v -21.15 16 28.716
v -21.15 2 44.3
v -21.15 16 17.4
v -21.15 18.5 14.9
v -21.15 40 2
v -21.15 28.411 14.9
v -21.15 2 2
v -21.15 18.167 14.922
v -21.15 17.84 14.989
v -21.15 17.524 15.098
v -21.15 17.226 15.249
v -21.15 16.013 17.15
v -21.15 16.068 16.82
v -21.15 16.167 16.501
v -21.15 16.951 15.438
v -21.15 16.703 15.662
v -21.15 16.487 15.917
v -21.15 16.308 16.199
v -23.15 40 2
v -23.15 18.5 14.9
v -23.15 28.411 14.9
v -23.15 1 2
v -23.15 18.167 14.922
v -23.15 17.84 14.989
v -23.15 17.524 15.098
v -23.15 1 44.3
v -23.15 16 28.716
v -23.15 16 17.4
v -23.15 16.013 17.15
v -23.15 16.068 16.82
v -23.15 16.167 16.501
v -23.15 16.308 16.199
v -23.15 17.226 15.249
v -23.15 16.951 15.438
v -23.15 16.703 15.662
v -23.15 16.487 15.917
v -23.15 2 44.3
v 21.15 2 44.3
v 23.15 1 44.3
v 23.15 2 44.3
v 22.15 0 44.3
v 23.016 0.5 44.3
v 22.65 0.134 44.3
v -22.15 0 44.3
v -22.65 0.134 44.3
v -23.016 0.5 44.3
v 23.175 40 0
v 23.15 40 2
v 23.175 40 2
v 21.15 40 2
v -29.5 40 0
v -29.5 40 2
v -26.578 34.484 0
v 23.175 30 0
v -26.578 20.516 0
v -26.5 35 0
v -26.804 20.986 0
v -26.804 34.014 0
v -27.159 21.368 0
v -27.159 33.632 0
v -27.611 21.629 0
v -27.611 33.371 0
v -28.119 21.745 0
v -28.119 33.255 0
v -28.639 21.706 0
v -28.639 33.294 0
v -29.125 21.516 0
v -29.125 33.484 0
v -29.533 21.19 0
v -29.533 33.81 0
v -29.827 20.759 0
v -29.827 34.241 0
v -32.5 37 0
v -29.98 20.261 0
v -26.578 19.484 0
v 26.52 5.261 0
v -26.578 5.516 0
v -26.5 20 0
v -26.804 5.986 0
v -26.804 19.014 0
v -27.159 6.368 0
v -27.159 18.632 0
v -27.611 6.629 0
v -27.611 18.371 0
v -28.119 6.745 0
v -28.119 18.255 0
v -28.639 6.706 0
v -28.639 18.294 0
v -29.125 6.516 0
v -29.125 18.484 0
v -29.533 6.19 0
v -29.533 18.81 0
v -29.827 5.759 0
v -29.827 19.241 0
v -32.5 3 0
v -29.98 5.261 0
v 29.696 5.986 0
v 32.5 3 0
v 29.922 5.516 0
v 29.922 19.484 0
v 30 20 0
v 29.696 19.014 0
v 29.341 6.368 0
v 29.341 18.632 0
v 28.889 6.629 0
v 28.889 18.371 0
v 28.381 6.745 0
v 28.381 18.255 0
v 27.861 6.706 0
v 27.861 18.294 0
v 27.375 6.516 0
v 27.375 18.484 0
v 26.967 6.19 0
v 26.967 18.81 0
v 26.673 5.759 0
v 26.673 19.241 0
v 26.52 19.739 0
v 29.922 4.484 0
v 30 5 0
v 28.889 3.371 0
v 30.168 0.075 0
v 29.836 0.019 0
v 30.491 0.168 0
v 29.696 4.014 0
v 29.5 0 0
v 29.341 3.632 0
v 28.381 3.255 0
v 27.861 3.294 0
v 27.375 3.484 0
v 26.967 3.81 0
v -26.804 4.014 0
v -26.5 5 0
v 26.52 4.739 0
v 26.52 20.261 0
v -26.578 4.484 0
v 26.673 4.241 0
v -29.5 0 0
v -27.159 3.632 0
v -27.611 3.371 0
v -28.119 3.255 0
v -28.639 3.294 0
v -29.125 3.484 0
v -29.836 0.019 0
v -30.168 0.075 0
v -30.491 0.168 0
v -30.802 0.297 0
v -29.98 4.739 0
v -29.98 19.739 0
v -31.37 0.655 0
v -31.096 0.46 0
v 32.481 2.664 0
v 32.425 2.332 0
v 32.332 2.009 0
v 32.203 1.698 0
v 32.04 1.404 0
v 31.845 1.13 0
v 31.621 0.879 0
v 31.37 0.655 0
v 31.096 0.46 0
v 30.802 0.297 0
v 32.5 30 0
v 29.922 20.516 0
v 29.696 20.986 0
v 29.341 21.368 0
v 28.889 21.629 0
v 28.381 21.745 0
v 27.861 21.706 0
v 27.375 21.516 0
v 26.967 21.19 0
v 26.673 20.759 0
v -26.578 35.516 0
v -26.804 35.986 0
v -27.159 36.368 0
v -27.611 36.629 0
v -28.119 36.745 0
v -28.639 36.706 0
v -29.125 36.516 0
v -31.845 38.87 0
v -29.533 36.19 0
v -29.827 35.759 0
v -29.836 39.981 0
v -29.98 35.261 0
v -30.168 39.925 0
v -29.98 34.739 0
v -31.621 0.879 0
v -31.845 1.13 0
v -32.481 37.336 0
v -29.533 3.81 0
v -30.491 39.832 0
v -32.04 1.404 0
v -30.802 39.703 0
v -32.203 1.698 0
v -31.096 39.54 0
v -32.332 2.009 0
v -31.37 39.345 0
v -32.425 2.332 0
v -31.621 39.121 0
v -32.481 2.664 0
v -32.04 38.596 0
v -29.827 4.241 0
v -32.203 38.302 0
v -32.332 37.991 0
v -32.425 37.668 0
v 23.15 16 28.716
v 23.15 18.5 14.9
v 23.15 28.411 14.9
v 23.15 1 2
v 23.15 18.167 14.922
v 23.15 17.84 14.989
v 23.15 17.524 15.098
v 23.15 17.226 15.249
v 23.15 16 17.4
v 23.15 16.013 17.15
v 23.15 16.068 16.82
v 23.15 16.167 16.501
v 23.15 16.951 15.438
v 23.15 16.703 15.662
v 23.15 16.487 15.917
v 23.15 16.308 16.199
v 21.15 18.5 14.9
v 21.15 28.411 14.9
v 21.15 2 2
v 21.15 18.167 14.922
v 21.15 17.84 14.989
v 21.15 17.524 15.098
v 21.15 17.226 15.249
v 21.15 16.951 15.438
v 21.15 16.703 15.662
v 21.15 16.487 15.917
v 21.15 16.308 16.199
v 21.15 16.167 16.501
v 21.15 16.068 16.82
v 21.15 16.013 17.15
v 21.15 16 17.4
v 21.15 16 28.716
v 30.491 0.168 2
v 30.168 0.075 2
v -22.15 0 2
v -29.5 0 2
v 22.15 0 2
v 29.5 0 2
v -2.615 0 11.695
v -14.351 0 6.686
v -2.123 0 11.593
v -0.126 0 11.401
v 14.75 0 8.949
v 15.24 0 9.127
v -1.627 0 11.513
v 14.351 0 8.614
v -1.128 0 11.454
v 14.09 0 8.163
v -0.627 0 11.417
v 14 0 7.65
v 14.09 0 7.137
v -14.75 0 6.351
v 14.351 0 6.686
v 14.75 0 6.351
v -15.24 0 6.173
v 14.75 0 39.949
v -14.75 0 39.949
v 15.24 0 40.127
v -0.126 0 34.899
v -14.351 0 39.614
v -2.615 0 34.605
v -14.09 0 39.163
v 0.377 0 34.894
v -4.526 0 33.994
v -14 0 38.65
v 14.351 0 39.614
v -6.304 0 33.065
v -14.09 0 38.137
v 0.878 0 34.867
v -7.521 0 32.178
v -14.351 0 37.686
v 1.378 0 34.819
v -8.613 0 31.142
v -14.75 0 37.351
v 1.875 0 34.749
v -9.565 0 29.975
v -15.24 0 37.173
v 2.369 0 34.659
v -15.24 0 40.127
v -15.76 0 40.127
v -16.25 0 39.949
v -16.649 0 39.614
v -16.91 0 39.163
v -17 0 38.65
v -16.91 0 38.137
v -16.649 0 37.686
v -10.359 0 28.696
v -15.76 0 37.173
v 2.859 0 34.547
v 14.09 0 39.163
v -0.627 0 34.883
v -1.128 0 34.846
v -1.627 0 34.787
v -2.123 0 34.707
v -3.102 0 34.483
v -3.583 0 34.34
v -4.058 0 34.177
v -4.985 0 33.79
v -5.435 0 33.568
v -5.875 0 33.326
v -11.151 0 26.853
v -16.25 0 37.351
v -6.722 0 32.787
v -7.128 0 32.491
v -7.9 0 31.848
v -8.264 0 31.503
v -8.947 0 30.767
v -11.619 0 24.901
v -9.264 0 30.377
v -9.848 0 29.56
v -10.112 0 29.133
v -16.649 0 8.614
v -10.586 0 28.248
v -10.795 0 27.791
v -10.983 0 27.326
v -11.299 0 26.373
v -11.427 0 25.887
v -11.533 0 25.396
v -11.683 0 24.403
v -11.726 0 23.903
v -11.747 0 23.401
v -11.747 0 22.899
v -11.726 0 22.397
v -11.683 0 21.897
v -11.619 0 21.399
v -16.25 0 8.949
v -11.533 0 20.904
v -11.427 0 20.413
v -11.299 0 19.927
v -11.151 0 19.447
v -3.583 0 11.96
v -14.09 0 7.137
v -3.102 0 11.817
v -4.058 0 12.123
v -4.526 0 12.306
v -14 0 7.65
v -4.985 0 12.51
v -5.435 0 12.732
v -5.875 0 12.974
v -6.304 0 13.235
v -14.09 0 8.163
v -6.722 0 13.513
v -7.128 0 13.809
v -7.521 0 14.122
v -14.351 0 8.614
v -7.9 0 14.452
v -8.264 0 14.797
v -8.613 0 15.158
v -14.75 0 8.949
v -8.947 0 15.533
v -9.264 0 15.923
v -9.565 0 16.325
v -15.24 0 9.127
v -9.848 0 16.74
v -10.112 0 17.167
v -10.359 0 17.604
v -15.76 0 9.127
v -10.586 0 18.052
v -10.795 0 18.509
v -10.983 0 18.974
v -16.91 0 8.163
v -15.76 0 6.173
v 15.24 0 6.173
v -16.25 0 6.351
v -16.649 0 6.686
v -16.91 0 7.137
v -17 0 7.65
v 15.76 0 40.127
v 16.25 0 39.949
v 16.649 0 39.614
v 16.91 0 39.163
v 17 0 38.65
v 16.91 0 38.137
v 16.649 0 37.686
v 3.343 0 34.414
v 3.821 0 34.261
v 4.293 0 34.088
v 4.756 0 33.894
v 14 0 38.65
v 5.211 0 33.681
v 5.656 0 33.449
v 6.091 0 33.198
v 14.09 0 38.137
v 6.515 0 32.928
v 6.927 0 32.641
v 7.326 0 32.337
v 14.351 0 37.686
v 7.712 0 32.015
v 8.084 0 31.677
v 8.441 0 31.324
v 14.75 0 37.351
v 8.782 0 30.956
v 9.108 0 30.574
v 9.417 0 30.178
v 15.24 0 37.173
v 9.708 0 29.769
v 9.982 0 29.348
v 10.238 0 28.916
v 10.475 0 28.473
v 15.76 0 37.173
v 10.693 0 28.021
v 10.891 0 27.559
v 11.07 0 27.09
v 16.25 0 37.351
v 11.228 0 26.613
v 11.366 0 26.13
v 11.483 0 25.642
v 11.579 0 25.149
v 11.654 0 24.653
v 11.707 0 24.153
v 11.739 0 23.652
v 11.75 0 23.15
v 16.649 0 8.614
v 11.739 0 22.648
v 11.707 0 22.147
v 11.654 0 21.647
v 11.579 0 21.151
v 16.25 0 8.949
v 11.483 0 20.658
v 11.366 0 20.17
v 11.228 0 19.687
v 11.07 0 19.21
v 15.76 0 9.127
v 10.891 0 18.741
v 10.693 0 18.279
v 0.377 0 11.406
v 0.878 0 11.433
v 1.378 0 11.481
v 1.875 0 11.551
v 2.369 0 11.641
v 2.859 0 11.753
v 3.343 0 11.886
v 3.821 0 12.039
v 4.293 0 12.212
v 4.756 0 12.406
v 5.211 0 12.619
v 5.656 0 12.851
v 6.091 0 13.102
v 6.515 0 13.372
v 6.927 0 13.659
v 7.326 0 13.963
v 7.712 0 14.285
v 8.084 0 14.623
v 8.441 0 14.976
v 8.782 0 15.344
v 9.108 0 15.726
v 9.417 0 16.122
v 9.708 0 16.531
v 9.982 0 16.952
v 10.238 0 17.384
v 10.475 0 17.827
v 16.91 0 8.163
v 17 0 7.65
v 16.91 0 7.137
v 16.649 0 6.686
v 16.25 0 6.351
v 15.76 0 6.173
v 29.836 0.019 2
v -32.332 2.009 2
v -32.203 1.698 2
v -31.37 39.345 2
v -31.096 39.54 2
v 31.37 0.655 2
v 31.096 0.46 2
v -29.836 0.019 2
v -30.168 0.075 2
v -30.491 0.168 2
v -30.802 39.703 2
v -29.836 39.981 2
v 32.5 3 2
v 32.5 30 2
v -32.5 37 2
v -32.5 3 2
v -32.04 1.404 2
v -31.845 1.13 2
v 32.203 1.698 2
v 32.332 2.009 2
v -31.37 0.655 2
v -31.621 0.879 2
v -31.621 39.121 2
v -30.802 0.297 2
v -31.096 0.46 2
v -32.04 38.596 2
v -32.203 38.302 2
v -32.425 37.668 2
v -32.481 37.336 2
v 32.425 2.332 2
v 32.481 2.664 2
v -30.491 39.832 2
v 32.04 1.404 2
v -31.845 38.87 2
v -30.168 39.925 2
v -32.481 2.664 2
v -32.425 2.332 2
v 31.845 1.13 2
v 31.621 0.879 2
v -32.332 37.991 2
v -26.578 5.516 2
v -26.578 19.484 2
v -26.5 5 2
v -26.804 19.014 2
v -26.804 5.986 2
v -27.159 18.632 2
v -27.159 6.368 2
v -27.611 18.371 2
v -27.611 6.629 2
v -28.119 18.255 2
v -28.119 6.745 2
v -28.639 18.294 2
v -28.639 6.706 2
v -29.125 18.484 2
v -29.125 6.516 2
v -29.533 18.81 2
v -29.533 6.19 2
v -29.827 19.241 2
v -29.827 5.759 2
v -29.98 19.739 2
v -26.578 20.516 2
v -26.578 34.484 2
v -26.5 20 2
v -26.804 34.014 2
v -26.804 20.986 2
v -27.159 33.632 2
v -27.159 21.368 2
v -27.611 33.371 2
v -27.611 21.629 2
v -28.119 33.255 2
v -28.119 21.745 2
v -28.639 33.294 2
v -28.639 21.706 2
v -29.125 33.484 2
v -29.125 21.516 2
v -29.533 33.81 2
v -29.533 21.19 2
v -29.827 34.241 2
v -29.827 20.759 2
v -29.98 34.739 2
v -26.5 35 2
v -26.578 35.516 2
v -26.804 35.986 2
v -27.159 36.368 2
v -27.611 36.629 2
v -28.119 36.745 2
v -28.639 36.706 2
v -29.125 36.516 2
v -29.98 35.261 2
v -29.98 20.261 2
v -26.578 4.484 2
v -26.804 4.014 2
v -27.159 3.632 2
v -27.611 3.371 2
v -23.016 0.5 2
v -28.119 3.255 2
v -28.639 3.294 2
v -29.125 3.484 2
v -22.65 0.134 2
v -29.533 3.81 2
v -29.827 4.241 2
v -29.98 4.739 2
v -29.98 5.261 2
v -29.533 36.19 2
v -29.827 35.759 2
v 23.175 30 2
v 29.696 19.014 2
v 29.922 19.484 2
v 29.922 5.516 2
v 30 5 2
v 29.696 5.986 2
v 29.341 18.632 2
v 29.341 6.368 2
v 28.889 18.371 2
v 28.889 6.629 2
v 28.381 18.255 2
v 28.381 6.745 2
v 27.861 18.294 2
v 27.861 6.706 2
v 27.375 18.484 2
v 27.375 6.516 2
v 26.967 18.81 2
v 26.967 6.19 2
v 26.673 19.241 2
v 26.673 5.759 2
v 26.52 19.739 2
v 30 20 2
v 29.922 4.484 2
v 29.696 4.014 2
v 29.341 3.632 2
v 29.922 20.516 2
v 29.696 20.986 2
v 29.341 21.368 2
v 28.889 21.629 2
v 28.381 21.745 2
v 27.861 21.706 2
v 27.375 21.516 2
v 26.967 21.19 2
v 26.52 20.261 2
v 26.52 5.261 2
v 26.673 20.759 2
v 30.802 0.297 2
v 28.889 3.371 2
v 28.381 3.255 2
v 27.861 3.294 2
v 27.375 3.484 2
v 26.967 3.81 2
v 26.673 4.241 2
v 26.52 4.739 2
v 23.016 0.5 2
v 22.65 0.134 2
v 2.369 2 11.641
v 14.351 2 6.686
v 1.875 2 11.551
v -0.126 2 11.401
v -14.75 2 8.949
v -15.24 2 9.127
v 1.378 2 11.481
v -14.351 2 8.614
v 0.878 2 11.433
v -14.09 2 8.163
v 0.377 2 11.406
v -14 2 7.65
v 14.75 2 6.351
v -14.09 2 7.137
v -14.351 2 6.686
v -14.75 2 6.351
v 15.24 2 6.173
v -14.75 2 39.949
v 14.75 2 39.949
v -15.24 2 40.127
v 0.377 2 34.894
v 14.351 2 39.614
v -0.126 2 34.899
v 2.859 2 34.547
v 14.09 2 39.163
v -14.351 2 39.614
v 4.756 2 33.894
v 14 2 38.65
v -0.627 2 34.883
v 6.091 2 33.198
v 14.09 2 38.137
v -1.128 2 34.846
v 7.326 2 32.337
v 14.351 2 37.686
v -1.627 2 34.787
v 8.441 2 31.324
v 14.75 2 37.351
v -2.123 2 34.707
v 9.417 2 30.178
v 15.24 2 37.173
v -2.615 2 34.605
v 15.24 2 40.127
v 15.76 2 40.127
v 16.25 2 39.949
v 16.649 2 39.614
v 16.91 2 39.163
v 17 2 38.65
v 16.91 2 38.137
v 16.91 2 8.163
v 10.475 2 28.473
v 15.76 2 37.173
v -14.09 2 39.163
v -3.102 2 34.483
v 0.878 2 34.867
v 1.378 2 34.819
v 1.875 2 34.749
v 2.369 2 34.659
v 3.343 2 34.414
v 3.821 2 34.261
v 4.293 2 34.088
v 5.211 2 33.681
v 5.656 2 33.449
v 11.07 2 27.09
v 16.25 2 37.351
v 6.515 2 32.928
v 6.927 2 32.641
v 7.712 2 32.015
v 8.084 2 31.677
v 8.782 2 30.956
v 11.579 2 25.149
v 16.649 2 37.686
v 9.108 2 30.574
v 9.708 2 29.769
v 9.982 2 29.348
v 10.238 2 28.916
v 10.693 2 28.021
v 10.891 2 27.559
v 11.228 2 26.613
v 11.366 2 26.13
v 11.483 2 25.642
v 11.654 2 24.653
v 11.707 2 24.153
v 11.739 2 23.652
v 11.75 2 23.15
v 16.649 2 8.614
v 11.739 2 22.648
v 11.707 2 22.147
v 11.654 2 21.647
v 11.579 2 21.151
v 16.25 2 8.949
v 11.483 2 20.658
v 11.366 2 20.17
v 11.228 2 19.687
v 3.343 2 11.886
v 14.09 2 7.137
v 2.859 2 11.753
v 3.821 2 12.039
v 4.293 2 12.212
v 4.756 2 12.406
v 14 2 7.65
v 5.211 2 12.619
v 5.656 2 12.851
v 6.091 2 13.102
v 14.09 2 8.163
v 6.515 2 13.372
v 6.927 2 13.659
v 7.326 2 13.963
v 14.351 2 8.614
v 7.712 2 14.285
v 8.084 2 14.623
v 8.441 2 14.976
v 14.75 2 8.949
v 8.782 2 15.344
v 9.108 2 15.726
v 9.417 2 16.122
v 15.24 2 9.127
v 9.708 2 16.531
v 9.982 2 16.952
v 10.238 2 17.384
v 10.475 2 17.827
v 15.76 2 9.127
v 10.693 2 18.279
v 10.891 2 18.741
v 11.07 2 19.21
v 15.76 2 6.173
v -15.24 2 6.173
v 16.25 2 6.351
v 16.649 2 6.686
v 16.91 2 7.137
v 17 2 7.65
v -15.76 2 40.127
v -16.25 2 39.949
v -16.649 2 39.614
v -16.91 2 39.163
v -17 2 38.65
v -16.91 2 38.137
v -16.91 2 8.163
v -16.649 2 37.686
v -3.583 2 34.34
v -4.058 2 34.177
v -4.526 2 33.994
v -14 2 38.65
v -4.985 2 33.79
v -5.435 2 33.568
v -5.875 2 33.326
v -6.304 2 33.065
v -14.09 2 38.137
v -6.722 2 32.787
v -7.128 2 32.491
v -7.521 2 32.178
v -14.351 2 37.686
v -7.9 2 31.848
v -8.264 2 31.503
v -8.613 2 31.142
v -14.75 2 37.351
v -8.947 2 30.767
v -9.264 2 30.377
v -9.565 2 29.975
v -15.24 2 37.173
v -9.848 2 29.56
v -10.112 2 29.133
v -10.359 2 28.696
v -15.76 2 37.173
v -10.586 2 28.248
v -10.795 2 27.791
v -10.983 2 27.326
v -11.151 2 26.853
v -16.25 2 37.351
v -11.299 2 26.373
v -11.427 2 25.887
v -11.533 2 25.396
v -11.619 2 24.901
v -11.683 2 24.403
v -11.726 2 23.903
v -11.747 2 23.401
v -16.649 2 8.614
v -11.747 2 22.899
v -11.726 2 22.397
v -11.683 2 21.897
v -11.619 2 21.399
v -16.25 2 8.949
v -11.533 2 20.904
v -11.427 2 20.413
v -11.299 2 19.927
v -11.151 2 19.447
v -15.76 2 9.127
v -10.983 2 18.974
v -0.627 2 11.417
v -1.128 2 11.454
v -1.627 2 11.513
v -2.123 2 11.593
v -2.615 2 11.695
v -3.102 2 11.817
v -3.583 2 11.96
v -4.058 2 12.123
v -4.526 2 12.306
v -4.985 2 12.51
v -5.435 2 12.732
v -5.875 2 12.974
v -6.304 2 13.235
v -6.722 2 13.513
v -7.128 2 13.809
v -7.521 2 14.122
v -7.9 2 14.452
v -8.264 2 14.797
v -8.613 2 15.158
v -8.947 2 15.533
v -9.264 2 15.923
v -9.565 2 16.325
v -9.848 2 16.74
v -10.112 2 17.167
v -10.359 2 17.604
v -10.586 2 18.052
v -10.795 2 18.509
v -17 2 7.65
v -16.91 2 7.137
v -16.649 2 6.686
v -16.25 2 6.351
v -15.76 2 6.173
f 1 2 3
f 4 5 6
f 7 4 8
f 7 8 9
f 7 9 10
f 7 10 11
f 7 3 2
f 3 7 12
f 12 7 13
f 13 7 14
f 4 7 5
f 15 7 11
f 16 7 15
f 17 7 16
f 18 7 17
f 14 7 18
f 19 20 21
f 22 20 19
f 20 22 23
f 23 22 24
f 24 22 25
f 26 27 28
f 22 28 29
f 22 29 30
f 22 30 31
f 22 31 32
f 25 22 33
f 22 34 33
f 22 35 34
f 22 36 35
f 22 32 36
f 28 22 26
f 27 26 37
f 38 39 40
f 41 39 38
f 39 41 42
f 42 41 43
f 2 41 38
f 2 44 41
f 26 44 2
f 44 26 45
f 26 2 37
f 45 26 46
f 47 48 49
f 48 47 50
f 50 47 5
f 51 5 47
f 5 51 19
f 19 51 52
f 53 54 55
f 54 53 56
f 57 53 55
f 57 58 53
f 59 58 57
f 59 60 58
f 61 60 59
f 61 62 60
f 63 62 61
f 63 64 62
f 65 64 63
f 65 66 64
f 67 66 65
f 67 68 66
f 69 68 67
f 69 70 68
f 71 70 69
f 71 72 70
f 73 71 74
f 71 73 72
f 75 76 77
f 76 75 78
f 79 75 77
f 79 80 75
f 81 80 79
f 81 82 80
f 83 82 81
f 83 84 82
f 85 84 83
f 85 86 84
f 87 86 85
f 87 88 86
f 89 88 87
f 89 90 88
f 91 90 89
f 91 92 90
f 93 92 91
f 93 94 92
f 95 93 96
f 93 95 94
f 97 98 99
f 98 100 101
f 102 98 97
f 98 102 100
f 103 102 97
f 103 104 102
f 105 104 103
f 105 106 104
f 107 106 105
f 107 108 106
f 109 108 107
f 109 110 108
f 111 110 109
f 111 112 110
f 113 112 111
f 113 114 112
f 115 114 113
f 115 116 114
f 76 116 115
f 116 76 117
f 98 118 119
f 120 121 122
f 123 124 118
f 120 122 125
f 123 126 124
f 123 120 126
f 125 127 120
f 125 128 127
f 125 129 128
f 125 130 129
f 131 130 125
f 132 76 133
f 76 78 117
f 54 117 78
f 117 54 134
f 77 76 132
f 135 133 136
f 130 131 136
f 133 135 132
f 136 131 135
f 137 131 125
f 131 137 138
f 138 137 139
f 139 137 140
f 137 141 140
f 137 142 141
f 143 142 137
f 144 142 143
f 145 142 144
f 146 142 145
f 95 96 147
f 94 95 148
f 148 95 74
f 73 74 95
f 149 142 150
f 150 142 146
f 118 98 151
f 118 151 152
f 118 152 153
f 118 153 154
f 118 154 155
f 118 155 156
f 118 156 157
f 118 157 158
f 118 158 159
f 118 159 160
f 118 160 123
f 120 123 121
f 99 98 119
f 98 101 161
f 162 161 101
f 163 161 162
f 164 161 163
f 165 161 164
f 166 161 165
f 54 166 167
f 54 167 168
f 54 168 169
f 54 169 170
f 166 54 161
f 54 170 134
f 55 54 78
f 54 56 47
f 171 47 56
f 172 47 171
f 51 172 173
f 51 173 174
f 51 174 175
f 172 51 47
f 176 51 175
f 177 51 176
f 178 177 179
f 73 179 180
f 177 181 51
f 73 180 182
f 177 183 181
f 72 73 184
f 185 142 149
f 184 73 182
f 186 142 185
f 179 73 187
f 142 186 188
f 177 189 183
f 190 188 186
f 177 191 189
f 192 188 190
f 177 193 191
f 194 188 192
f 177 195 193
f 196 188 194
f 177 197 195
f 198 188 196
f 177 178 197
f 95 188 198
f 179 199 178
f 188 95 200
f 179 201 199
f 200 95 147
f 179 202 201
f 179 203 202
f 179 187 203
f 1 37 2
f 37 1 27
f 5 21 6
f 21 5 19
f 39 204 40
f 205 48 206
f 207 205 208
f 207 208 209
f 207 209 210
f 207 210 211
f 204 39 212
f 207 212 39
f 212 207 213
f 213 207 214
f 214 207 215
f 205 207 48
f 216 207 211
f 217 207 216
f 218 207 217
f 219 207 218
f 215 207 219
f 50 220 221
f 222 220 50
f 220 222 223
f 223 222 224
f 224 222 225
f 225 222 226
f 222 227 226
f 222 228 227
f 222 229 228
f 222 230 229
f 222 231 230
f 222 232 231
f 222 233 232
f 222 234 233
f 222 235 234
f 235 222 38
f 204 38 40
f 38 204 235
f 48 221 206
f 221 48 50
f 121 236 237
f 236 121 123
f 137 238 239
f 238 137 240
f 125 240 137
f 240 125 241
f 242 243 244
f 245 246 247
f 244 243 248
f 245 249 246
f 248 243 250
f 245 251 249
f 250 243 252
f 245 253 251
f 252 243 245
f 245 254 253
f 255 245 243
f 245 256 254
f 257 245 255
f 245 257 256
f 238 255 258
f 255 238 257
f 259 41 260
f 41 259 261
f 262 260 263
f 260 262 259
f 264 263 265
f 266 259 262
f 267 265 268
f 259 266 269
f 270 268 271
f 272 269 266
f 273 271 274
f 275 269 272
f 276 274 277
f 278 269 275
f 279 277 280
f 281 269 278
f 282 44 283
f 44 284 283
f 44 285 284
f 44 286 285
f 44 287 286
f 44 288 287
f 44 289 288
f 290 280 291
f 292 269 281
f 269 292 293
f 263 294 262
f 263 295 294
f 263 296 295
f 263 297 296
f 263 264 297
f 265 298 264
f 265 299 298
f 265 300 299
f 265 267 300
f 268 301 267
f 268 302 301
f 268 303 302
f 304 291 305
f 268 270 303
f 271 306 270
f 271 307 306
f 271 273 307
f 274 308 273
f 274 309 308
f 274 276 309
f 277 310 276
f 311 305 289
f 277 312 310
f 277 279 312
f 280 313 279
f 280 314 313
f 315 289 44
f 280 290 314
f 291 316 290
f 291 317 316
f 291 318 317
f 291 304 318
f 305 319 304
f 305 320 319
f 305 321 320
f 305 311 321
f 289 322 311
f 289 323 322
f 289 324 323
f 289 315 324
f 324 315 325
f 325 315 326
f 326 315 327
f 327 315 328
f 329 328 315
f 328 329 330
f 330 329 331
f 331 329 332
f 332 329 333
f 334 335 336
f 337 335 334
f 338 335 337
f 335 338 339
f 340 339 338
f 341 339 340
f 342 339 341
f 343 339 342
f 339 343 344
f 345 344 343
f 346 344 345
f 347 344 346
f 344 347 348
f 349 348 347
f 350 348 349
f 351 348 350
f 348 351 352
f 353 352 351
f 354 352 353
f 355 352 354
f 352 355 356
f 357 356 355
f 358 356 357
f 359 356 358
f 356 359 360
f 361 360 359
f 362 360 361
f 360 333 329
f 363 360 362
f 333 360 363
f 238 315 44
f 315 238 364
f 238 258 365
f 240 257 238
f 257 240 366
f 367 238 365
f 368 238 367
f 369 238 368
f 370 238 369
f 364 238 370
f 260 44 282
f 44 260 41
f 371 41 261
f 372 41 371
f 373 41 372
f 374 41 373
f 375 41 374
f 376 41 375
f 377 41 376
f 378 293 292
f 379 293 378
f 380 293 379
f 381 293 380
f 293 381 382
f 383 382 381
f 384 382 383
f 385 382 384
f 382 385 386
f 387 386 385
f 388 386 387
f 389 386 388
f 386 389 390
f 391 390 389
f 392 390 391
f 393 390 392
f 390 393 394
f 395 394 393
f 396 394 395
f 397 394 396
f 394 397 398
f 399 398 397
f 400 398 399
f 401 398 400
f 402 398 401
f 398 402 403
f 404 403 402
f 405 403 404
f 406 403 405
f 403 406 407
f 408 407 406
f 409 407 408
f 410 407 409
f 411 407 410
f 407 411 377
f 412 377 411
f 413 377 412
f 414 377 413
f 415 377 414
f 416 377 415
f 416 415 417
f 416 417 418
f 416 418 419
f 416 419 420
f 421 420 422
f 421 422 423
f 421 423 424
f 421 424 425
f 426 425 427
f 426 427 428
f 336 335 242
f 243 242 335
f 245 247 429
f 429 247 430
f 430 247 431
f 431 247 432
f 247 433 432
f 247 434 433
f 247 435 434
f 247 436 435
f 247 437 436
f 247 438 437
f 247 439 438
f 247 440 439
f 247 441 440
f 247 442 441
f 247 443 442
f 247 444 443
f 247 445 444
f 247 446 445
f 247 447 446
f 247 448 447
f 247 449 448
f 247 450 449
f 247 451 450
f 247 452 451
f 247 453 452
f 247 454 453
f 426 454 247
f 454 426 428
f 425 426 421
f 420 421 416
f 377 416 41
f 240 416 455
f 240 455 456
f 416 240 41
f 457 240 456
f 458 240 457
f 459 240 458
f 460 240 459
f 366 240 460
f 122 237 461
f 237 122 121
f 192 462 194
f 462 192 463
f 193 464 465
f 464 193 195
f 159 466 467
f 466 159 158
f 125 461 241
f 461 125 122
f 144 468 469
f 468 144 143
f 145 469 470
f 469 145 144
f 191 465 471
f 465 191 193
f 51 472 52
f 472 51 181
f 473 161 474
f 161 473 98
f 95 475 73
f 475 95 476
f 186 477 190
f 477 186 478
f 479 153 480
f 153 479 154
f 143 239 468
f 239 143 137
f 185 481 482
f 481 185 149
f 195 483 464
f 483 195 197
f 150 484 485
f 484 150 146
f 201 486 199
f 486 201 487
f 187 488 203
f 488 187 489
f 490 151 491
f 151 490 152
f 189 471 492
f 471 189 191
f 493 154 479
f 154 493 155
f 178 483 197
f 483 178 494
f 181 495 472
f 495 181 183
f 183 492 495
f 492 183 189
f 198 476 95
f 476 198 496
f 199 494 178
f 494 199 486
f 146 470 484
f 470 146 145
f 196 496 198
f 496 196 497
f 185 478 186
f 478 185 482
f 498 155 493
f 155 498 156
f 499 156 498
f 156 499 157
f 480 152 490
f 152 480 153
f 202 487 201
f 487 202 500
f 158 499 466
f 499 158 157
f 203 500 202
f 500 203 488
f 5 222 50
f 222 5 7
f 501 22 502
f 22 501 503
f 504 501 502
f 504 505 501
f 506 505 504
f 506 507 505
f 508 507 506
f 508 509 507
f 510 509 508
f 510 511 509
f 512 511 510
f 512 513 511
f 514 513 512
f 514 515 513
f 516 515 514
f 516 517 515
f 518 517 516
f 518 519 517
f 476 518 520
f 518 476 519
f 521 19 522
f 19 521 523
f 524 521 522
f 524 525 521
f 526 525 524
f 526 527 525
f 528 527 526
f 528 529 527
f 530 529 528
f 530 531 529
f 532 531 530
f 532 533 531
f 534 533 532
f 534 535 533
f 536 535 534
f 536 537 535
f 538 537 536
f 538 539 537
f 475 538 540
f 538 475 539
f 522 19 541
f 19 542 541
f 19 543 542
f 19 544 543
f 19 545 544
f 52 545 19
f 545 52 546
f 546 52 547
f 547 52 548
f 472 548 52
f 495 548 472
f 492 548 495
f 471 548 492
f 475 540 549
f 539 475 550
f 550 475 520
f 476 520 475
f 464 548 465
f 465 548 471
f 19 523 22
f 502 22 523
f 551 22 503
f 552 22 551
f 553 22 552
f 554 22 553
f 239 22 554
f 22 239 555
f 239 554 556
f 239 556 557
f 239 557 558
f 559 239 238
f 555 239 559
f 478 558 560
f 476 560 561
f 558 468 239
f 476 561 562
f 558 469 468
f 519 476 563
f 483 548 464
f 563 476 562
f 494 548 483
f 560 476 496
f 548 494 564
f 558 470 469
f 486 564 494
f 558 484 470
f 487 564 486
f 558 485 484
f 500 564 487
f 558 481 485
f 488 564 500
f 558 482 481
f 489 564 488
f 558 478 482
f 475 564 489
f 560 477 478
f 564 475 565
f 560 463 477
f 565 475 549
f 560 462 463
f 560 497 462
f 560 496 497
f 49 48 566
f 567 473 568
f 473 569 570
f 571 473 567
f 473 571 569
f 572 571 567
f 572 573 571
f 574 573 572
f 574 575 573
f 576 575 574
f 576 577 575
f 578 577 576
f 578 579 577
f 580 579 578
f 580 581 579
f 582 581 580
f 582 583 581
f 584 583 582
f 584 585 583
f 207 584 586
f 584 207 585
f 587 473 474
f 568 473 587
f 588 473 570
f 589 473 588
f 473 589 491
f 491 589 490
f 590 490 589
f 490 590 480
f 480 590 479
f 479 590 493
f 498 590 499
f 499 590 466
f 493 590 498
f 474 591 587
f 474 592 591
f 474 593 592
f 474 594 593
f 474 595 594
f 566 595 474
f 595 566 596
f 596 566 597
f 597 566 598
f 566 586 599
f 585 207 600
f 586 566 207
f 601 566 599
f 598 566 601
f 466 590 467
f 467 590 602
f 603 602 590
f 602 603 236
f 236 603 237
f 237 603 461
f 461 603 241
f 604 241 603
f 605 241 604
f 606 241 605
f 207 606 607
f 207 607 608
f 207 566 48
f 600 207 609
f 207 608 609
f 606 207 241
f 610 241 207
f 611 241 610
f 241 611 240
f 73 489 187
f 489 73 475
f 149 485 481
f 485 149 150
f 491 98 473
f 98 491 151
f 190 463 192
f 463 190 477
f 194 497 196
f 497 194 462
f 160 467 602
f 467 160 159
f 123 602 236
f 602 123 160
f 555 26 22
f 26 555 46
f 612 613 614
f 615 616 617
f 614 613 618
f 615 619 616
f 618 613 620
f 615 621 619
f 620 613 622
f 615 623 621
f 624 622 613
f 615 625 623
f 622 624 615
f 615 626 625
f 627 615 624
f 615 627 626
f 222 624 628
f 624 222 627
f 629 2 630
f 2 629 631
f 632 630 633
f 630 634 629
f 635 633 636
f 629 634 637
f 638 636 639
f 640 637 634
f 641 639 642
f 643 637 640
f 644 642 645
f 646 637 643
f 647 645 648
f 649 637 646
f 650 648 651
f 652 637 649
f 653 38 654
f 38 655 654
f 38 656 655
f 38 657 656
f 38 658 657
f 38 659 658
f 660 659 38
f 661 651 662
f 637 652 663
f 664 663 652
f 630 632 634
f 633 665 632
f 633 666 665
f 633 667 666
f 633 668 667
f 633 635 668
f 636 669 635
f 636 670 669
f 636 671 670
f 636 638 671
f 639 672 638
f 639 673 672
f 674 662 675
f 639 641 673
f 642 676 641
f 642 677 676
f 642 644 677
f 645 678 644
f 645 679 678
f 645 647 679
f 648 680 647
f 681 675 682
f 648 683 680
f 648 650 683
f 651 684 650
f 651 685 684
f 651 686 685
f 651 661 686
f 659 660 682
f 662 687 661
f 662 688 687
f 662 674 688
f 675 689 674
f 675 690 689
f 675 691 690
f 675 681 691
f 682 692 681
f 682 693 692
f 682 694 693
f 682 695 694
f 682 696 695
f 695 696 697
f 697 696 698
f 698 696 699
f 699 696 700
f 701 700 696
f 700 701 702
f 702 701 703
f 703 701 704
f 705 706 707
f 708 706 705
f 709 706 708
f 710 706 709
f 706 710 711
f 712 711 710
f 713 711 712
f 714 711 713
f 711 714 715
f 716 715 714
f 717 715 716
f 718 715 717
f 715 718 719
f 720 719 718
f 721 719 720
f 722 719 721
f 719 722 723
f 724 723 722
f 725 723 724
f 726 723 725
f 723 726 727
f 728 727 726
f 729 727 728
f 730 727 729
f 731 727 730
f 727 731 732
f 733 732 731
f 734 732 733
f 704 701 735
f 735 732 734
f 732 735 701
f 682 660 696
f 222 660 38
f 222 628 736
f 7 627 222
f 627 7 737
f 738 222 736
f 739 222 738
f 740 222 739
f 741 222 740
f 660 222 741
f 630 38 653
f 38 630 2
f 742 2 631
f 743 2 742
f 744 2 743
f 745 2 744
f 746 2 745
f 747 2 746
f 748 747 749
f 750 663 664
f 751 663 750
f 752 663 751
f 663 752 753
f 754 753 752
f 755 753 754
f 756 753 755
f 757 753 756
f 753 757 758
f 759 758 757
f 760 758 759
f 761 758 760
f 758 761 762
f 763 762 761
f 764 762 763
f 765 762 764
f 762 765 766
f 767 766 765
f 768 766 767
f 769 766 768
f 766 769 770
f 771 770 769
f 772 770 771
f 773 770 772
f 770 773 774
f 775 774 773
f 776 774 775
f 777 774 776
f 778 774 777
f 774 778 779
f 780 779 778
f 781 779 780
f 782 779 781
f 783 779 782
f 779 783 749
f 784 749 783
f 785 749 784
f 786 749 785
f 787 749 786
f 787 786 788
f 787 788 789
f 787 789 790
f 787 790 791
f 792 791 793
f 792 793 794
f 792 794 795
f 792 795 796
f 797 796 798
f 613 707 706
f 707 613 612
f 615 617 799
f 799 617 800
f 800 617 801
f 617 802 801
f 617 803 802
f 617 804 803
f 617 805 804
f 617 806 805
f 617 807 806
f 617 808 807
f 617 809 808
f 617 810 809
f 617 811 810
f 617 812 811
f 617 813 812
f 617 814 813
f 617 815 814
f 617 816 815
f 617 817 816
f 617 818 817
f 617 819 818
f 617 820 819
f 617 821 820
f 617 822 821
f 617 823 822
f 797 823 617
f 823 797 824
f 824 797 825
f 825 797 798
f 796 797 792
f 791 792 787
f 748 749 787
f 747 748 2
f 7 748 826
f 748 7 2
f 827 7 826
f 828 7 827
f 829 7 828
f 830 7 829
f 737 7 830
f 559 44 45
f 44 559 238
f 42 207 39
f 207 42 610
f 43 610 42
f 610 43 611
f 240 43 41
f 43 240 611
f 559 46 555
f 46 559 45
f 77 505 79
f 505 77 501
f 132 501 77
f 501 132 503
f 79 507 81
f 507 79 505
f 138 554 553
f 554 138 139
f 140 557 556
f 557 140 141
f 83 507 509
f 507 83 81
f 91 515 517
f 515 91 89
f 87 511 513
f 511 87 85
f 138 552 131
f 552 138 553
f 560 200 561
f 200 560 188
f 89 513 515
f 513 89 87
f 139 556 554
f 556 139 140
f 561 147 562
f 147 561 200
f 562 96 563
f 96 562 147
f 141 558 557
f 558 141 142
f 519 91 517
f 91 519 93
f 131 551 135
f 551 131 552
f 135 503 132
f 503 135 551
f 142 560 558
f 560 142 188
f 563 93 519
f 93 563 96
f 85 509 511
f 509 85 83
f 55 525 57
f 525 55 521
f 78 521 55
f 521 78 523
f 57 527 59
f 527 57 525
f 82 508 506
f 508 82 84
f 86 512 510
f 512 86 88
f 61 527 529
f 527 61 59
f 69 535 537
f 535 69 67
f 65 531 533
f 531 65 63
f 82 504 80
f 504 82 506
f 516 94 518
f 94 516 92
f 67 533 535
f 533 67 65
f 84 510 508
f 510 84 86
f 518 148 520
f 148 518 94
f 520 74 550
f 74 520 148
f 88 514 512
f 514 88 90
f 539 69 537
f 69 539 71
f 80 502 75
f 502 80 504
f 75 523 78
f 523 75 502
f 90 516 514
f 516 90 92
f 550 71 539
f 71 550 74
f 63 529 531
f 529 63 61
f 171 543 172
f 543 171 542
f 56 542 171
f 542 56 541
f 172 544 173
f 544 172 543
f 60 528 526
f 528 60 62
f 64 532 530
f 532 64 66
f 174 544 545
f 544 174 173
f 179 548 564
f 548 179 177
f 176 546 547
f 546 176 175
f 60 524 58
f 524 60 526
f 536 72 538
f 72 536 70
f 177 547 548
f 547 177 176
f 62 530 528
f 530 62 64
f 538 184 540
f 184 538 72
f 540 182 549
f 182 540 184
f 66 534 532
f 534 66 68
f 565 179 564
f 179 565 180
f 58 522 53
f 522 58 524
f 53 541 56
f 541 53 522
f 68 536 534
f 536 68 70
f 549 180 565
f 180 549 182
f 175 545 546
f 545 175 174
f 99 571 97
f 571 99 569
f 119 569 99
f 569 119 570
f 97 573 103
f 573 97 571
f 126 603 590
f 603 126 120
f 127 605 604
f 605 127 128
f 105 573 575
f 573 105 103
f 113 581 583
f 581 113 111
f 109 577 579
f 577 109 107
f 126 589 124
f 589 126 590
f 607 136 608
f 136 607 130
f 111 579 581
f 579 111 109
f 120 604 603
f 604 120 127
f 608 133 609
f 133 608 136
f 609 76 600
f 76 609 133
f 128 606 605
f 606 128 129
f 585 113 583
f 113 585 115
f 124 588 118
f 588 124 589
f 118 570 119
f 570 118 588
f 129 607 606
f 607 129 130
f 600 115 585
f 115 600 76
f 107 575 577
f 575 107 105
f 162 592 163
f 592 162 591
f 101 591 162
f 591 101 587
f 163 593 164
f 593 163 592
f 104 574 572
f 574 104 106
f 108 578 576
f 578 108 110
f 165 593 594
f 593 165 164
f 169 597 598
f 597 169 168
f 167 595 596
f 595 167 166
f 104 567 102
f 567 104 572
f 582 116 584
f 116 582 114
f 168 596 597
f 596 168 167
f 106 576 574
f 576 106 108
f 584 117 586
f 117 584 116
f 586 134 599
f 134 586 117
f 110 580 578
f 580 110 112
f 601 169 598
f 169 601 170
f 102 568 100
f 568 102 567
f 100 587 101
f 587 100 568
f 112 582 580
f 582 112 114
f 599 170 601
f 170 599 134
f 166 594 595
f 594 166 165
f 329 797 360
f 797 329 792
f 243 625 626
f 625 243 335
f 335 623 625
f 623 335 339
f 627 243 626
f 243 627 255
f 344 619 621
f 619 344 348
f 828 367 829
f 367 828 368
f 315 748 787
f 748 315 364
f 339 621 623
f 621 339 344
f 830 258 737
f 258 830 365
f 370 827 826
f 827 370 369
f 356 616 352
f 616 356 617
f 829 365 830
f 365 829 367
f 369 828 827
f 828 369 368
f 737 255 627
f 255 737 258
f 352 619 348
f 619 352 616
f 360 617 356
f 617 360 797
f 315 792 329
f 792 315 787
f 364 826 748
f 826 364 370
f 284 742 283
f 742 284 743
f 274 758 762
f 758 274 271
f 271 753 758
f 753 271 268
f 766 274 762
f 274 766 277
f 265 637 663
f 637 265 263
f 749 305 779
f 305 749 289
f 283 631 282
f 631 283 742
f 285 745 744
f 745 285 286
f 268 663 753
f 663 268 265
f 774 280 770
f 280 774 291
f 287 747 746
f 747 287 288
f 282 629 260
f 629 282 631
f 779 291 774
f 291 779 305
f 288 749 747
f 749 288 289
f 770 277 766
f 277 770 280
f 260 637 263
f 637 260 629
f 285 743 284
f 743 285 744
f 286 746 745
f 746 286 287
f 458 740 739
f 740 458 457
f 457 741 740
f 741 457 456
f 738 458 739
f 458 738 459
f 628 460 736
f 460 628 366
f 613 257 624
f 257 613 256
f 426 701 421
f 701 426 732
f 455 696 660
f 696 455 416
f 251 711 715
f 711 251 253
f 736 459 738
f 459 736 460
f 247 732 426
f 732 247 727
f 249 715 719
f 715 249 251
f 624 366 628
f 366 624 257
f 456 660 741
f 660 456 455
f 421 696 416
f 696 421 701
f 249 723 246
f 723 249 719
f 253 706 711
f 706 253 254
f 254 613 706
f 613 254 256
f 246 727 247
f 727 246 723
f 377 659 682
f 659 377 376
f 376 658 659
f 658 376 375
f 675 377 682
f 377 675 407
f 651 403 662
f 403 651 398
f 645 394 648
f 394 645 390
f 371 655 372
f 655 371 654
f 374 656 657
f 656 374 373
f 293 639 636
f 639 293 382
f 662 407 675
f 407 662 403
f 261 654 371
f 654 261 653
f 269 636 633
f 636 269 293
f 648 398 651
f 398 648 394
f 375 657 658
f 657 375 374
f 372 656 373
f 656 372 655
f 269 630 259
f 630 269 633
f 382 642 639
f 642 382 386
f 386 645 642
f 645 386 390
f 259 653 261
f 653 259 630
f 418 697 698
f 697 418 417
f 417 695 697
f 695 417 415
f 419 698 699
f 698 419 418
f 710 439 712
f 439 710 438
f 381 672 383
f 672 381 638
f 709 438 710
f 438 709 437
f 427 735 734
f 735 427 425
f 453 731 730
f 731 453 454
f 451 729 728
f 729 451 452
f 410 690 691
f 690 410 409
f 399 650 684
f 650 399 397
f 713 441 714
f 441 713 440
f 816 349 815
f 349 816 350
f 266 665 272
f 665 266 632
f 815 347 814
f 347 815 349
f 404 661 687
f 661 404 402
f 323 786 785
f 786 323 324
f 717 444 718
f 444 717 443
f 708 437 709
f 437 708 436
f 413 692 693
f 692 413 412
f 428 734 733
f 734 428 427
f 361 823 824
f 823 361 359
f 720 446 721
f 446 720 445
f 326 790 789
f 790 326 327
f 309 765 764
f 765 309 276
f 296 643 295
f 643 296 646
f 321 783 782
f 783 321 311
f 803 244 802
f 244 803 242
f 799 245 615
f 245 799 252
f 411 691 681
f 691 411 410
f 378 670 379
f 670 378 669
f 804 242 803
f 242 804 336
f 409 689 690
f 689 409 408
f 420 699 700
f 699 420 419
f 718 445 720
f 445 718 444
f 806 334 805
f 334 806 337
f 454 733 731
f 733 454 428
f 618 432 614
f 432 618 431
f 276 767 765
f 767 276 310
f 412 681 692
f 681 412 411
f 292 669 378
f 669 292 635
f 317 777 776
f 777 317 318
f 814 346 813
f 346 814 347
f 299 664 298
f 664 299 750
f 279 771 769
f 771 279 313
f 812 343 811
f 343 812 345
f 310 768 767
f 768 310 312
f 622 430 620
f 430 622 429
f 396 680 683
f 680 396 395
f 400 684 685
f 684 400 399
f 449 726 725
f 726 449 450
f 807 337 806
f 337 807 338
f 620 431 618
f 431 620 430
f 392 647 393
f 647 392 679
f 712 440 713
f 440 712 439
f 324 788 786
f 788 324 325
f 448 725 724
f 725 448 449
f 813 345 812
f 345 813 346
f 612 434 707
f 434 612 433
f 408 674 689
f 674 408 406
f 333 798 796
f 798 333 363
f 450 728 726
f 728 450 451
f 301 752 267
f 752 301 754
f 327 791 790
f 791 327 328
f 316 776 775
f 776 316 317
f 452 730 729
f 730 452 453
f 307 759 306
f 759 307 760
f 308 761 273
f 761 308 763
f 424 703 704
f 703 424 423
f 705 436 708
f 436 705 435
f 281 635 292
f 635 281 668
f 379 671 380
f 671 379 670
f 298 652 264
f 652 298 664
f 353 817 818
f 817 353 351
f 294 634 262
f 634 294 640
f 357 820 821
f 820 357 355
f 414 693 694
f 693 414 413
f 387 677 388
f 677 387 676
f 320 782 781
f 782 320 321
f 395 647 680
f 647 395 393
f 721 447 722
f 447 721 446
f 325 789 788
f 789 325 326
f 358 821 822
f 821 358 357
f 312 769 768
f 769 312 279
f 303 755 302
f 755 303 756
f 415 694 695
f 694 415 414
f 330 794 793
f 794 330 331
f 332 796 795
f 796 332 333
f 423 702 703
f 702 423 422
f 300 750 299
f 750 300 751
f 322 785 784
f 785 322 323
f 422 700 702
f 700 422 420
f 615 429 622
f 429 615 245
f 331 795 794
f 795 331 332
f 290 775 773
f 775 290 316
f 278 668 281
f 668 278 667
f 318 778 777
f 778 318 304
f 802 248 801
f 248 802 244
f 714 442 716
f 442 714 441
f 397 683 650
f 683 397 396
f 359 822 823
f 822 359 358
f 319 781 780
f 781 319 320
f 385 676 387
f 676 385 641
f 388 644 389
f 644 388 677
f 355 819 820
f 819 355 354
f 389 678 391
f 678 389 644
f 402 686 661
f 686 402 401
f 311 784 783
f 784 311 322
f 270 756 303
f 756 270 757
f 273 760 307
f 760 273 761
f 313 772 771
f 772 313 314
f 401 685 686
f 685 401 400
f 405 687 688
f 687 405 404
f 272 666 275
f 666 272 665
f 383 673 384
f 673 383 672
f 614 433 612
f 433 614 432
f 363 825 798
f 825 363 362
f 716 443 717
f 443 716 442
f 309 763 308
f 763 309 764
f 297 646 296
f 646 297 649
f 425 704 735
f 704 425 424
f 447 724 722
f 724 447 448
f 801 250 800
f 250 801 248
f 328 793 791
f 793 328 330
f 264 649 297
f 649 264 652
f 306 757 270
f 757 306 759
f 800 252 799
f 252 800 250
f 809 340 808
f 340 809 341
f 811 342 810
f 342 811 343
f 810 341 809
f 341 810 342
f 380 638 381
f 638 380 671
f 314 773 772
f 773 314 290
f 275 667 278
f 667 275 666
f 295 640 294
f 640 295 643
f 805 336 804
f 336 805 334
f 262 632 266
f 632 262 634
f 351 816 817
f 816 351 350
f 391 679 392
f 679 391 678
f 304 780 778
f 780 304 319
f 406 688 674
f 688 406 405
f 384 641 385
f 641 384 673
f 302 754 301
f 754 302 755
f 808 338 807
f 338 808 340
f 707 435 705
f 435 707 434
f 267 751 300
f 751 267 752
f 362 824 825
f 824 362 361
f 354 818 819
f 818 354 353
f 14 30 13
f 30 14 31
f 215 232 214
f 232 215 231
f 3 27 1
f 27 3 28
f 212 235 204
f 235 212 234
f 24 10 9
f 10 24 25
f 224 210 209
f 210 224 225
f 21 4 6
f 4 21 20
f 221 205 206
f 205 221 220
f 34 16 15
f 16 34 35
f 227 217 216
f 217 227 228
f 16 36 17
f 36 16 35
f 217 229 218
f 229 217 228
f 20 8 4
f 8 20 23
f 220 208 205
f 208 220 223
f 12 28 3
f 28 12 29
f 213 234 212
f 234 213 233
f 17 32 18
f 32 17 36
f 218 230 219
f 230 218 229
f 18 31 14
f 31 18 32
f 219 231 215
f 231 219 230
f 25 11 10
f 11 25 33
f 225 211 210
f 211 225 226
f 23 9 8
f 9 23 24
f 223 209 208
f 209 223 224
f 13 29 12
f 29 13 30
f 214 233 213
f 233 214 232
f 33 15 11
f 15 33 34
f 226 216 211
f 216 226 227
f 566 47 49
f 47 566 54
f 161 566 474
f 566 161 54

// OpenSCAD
// The thickness of the mount plate (in mm)
mountplate_thickness = 2 ; // [0:10]
// The thickness of the motor mount plate (in mm)
motormountplate_thickness = 2 ; // [2:7]

/* [Hidden] */
layer_height=.2; extrusion_width=.4;
epsilon=.01;

module smoothen(r) {
 offset(r=+r,$fn=r*PI*6) offset(delta=-r) children();
}

module the_bracket(
 mountplate_size=[62,40],
 mountplate_r = 3,
 mounthole_d = 3.5,
 mountholes_span=[54,30],
 motor_side=42.3,
 motor_protrusion_hole_d = 23.5,
 motormountholes_span = 31,
 thickness = 2,
 motormountplate_thickness = motormountplate_thickness,
 mountplate_thickness = mountplate_thickness,
 motormounthole_d = 3,
 motorconnector_width = 16.5,
 motorconnector_hole_r = 2.5,
 motorconnector_distance = 16.5,
 mountscrew_l = 10, mountscrewhead_d = 6, mountscrewhead_h = 3,
 mounthole_depth = 5,
 motormounthole_depth = 4,
 extra_spacer = 0
) {
 titan_h = 25; titan_bowdenmount_h = 4;
 echo("max longscrew",titan_h+motormountplate_thickness+extra_spacer+motormounthole_depth);
 echo("max shortscrew",titan_bowdenmount_h+motormountplate_thickness+extra_spacer+motormounthole_depth);
 difference() {
  union() {
   // mount plate
   linear_extrude(height=mountplate_thickness)
   smoothen(r=mountplate_r)
   translate([-mountplate_size.x/2,0])
   square(size=mountplate_size);
   // motor mount plate
   hull() for(sx=[-1,1])
   translate([sx*(motor_side/2+thickness-motormountplate_thickness/2),motormountplate_thickness/2,0])
   cylinder(d=motormountplate_thickness,h=motor_side+mountplate_thickness,$fn=motormountplate_thickness*PI*2);
   // sides
   for(sx=[-1,1]) translate([sx*(motor_side+thickness)/2,0,0])
   hull() {
    translate([-thickness/2,motormountplate_thickness/2,0])
    cube(size=[thickness,mountplate_size.y-motormountplate_thickness/2,mountplate_thickness]);
    translate([-thickness/2,motormountplate_thickness/2,0])
    cube(size=[thickness,motormountplate_thickness/2,mountplate_thickness+motor_side]);
   }
  }
  // mount holes
  for(sx=[-1,1]) for(sy=[-1,0,1])
   translate([sx*mountholes_span.x/2,sy*mountholes_span.y/2,0])
   translate([0,mountplate_size.y/2,0]) {
    translate([0,0,-1])
    cylinder(d=mounthole_d,h=mountplate_thickness+2,$fn=mounthole_d*PI*2);
    translate([0,0,mountscrew_l-mounthole_depth])
    cylinder(d=mountscrewhead_d,h=mountplate_thickness+1,$fn=mountscrewhead_d*PI*2);
   }
  // motor protrusion cutout
  translate([0,0,mountplate_thickness+motor_side/2])
  rotate([-90,0,0]) translate([0,0,-1])
  cylinder(d=motor_protrusion_hole_d,h=motormountplate_thickness+2,$fn=motor_protrusion_hole_d*PI*2);
  // motor mount holes
  for(sx=[-1,1]) for(sz=[-1,1])
   translate([sx*motormountholes_span/2,0,sz*motormountholes_span/2])
   translate([0,0,mountplate_thickness+motor_side/2])
   rotate([-90,0,0]) translate([0,0,-1])
   cylinder(d=motormounthole_d,h=motormountplate_thickness+2,$fn=motormounthole_d*PI*2);
  // motor connector cutout
  translate([mountplate_size.x/2,
             motormountplate_thickness+extra_spacer+motorconnector_distance-motorconnector_hole_r,
             mountplate_thickness+motor_side/2-motorconnector_width/2])
  rotate([0,-90,0])
  linear_extrude(height=mountplate_size.x)
  smoothen(r=motorconnector_hole_r)
  square([motor_side+mountplate_thickness+1,mountplate_size.y]);
 }//difference
}//the_bracket module


module standard_bracket() {
    the_bracket();
}

module mp_mini_bracket() {
    difference() {
        the_bracket(
            mountplate_size=[65,40],
            mountholes_span=[56.5,30]
        );
        translate([23.175, 30, 0]) cube([50, 50, 50]);
    }
}

mp_mini_bracket();
